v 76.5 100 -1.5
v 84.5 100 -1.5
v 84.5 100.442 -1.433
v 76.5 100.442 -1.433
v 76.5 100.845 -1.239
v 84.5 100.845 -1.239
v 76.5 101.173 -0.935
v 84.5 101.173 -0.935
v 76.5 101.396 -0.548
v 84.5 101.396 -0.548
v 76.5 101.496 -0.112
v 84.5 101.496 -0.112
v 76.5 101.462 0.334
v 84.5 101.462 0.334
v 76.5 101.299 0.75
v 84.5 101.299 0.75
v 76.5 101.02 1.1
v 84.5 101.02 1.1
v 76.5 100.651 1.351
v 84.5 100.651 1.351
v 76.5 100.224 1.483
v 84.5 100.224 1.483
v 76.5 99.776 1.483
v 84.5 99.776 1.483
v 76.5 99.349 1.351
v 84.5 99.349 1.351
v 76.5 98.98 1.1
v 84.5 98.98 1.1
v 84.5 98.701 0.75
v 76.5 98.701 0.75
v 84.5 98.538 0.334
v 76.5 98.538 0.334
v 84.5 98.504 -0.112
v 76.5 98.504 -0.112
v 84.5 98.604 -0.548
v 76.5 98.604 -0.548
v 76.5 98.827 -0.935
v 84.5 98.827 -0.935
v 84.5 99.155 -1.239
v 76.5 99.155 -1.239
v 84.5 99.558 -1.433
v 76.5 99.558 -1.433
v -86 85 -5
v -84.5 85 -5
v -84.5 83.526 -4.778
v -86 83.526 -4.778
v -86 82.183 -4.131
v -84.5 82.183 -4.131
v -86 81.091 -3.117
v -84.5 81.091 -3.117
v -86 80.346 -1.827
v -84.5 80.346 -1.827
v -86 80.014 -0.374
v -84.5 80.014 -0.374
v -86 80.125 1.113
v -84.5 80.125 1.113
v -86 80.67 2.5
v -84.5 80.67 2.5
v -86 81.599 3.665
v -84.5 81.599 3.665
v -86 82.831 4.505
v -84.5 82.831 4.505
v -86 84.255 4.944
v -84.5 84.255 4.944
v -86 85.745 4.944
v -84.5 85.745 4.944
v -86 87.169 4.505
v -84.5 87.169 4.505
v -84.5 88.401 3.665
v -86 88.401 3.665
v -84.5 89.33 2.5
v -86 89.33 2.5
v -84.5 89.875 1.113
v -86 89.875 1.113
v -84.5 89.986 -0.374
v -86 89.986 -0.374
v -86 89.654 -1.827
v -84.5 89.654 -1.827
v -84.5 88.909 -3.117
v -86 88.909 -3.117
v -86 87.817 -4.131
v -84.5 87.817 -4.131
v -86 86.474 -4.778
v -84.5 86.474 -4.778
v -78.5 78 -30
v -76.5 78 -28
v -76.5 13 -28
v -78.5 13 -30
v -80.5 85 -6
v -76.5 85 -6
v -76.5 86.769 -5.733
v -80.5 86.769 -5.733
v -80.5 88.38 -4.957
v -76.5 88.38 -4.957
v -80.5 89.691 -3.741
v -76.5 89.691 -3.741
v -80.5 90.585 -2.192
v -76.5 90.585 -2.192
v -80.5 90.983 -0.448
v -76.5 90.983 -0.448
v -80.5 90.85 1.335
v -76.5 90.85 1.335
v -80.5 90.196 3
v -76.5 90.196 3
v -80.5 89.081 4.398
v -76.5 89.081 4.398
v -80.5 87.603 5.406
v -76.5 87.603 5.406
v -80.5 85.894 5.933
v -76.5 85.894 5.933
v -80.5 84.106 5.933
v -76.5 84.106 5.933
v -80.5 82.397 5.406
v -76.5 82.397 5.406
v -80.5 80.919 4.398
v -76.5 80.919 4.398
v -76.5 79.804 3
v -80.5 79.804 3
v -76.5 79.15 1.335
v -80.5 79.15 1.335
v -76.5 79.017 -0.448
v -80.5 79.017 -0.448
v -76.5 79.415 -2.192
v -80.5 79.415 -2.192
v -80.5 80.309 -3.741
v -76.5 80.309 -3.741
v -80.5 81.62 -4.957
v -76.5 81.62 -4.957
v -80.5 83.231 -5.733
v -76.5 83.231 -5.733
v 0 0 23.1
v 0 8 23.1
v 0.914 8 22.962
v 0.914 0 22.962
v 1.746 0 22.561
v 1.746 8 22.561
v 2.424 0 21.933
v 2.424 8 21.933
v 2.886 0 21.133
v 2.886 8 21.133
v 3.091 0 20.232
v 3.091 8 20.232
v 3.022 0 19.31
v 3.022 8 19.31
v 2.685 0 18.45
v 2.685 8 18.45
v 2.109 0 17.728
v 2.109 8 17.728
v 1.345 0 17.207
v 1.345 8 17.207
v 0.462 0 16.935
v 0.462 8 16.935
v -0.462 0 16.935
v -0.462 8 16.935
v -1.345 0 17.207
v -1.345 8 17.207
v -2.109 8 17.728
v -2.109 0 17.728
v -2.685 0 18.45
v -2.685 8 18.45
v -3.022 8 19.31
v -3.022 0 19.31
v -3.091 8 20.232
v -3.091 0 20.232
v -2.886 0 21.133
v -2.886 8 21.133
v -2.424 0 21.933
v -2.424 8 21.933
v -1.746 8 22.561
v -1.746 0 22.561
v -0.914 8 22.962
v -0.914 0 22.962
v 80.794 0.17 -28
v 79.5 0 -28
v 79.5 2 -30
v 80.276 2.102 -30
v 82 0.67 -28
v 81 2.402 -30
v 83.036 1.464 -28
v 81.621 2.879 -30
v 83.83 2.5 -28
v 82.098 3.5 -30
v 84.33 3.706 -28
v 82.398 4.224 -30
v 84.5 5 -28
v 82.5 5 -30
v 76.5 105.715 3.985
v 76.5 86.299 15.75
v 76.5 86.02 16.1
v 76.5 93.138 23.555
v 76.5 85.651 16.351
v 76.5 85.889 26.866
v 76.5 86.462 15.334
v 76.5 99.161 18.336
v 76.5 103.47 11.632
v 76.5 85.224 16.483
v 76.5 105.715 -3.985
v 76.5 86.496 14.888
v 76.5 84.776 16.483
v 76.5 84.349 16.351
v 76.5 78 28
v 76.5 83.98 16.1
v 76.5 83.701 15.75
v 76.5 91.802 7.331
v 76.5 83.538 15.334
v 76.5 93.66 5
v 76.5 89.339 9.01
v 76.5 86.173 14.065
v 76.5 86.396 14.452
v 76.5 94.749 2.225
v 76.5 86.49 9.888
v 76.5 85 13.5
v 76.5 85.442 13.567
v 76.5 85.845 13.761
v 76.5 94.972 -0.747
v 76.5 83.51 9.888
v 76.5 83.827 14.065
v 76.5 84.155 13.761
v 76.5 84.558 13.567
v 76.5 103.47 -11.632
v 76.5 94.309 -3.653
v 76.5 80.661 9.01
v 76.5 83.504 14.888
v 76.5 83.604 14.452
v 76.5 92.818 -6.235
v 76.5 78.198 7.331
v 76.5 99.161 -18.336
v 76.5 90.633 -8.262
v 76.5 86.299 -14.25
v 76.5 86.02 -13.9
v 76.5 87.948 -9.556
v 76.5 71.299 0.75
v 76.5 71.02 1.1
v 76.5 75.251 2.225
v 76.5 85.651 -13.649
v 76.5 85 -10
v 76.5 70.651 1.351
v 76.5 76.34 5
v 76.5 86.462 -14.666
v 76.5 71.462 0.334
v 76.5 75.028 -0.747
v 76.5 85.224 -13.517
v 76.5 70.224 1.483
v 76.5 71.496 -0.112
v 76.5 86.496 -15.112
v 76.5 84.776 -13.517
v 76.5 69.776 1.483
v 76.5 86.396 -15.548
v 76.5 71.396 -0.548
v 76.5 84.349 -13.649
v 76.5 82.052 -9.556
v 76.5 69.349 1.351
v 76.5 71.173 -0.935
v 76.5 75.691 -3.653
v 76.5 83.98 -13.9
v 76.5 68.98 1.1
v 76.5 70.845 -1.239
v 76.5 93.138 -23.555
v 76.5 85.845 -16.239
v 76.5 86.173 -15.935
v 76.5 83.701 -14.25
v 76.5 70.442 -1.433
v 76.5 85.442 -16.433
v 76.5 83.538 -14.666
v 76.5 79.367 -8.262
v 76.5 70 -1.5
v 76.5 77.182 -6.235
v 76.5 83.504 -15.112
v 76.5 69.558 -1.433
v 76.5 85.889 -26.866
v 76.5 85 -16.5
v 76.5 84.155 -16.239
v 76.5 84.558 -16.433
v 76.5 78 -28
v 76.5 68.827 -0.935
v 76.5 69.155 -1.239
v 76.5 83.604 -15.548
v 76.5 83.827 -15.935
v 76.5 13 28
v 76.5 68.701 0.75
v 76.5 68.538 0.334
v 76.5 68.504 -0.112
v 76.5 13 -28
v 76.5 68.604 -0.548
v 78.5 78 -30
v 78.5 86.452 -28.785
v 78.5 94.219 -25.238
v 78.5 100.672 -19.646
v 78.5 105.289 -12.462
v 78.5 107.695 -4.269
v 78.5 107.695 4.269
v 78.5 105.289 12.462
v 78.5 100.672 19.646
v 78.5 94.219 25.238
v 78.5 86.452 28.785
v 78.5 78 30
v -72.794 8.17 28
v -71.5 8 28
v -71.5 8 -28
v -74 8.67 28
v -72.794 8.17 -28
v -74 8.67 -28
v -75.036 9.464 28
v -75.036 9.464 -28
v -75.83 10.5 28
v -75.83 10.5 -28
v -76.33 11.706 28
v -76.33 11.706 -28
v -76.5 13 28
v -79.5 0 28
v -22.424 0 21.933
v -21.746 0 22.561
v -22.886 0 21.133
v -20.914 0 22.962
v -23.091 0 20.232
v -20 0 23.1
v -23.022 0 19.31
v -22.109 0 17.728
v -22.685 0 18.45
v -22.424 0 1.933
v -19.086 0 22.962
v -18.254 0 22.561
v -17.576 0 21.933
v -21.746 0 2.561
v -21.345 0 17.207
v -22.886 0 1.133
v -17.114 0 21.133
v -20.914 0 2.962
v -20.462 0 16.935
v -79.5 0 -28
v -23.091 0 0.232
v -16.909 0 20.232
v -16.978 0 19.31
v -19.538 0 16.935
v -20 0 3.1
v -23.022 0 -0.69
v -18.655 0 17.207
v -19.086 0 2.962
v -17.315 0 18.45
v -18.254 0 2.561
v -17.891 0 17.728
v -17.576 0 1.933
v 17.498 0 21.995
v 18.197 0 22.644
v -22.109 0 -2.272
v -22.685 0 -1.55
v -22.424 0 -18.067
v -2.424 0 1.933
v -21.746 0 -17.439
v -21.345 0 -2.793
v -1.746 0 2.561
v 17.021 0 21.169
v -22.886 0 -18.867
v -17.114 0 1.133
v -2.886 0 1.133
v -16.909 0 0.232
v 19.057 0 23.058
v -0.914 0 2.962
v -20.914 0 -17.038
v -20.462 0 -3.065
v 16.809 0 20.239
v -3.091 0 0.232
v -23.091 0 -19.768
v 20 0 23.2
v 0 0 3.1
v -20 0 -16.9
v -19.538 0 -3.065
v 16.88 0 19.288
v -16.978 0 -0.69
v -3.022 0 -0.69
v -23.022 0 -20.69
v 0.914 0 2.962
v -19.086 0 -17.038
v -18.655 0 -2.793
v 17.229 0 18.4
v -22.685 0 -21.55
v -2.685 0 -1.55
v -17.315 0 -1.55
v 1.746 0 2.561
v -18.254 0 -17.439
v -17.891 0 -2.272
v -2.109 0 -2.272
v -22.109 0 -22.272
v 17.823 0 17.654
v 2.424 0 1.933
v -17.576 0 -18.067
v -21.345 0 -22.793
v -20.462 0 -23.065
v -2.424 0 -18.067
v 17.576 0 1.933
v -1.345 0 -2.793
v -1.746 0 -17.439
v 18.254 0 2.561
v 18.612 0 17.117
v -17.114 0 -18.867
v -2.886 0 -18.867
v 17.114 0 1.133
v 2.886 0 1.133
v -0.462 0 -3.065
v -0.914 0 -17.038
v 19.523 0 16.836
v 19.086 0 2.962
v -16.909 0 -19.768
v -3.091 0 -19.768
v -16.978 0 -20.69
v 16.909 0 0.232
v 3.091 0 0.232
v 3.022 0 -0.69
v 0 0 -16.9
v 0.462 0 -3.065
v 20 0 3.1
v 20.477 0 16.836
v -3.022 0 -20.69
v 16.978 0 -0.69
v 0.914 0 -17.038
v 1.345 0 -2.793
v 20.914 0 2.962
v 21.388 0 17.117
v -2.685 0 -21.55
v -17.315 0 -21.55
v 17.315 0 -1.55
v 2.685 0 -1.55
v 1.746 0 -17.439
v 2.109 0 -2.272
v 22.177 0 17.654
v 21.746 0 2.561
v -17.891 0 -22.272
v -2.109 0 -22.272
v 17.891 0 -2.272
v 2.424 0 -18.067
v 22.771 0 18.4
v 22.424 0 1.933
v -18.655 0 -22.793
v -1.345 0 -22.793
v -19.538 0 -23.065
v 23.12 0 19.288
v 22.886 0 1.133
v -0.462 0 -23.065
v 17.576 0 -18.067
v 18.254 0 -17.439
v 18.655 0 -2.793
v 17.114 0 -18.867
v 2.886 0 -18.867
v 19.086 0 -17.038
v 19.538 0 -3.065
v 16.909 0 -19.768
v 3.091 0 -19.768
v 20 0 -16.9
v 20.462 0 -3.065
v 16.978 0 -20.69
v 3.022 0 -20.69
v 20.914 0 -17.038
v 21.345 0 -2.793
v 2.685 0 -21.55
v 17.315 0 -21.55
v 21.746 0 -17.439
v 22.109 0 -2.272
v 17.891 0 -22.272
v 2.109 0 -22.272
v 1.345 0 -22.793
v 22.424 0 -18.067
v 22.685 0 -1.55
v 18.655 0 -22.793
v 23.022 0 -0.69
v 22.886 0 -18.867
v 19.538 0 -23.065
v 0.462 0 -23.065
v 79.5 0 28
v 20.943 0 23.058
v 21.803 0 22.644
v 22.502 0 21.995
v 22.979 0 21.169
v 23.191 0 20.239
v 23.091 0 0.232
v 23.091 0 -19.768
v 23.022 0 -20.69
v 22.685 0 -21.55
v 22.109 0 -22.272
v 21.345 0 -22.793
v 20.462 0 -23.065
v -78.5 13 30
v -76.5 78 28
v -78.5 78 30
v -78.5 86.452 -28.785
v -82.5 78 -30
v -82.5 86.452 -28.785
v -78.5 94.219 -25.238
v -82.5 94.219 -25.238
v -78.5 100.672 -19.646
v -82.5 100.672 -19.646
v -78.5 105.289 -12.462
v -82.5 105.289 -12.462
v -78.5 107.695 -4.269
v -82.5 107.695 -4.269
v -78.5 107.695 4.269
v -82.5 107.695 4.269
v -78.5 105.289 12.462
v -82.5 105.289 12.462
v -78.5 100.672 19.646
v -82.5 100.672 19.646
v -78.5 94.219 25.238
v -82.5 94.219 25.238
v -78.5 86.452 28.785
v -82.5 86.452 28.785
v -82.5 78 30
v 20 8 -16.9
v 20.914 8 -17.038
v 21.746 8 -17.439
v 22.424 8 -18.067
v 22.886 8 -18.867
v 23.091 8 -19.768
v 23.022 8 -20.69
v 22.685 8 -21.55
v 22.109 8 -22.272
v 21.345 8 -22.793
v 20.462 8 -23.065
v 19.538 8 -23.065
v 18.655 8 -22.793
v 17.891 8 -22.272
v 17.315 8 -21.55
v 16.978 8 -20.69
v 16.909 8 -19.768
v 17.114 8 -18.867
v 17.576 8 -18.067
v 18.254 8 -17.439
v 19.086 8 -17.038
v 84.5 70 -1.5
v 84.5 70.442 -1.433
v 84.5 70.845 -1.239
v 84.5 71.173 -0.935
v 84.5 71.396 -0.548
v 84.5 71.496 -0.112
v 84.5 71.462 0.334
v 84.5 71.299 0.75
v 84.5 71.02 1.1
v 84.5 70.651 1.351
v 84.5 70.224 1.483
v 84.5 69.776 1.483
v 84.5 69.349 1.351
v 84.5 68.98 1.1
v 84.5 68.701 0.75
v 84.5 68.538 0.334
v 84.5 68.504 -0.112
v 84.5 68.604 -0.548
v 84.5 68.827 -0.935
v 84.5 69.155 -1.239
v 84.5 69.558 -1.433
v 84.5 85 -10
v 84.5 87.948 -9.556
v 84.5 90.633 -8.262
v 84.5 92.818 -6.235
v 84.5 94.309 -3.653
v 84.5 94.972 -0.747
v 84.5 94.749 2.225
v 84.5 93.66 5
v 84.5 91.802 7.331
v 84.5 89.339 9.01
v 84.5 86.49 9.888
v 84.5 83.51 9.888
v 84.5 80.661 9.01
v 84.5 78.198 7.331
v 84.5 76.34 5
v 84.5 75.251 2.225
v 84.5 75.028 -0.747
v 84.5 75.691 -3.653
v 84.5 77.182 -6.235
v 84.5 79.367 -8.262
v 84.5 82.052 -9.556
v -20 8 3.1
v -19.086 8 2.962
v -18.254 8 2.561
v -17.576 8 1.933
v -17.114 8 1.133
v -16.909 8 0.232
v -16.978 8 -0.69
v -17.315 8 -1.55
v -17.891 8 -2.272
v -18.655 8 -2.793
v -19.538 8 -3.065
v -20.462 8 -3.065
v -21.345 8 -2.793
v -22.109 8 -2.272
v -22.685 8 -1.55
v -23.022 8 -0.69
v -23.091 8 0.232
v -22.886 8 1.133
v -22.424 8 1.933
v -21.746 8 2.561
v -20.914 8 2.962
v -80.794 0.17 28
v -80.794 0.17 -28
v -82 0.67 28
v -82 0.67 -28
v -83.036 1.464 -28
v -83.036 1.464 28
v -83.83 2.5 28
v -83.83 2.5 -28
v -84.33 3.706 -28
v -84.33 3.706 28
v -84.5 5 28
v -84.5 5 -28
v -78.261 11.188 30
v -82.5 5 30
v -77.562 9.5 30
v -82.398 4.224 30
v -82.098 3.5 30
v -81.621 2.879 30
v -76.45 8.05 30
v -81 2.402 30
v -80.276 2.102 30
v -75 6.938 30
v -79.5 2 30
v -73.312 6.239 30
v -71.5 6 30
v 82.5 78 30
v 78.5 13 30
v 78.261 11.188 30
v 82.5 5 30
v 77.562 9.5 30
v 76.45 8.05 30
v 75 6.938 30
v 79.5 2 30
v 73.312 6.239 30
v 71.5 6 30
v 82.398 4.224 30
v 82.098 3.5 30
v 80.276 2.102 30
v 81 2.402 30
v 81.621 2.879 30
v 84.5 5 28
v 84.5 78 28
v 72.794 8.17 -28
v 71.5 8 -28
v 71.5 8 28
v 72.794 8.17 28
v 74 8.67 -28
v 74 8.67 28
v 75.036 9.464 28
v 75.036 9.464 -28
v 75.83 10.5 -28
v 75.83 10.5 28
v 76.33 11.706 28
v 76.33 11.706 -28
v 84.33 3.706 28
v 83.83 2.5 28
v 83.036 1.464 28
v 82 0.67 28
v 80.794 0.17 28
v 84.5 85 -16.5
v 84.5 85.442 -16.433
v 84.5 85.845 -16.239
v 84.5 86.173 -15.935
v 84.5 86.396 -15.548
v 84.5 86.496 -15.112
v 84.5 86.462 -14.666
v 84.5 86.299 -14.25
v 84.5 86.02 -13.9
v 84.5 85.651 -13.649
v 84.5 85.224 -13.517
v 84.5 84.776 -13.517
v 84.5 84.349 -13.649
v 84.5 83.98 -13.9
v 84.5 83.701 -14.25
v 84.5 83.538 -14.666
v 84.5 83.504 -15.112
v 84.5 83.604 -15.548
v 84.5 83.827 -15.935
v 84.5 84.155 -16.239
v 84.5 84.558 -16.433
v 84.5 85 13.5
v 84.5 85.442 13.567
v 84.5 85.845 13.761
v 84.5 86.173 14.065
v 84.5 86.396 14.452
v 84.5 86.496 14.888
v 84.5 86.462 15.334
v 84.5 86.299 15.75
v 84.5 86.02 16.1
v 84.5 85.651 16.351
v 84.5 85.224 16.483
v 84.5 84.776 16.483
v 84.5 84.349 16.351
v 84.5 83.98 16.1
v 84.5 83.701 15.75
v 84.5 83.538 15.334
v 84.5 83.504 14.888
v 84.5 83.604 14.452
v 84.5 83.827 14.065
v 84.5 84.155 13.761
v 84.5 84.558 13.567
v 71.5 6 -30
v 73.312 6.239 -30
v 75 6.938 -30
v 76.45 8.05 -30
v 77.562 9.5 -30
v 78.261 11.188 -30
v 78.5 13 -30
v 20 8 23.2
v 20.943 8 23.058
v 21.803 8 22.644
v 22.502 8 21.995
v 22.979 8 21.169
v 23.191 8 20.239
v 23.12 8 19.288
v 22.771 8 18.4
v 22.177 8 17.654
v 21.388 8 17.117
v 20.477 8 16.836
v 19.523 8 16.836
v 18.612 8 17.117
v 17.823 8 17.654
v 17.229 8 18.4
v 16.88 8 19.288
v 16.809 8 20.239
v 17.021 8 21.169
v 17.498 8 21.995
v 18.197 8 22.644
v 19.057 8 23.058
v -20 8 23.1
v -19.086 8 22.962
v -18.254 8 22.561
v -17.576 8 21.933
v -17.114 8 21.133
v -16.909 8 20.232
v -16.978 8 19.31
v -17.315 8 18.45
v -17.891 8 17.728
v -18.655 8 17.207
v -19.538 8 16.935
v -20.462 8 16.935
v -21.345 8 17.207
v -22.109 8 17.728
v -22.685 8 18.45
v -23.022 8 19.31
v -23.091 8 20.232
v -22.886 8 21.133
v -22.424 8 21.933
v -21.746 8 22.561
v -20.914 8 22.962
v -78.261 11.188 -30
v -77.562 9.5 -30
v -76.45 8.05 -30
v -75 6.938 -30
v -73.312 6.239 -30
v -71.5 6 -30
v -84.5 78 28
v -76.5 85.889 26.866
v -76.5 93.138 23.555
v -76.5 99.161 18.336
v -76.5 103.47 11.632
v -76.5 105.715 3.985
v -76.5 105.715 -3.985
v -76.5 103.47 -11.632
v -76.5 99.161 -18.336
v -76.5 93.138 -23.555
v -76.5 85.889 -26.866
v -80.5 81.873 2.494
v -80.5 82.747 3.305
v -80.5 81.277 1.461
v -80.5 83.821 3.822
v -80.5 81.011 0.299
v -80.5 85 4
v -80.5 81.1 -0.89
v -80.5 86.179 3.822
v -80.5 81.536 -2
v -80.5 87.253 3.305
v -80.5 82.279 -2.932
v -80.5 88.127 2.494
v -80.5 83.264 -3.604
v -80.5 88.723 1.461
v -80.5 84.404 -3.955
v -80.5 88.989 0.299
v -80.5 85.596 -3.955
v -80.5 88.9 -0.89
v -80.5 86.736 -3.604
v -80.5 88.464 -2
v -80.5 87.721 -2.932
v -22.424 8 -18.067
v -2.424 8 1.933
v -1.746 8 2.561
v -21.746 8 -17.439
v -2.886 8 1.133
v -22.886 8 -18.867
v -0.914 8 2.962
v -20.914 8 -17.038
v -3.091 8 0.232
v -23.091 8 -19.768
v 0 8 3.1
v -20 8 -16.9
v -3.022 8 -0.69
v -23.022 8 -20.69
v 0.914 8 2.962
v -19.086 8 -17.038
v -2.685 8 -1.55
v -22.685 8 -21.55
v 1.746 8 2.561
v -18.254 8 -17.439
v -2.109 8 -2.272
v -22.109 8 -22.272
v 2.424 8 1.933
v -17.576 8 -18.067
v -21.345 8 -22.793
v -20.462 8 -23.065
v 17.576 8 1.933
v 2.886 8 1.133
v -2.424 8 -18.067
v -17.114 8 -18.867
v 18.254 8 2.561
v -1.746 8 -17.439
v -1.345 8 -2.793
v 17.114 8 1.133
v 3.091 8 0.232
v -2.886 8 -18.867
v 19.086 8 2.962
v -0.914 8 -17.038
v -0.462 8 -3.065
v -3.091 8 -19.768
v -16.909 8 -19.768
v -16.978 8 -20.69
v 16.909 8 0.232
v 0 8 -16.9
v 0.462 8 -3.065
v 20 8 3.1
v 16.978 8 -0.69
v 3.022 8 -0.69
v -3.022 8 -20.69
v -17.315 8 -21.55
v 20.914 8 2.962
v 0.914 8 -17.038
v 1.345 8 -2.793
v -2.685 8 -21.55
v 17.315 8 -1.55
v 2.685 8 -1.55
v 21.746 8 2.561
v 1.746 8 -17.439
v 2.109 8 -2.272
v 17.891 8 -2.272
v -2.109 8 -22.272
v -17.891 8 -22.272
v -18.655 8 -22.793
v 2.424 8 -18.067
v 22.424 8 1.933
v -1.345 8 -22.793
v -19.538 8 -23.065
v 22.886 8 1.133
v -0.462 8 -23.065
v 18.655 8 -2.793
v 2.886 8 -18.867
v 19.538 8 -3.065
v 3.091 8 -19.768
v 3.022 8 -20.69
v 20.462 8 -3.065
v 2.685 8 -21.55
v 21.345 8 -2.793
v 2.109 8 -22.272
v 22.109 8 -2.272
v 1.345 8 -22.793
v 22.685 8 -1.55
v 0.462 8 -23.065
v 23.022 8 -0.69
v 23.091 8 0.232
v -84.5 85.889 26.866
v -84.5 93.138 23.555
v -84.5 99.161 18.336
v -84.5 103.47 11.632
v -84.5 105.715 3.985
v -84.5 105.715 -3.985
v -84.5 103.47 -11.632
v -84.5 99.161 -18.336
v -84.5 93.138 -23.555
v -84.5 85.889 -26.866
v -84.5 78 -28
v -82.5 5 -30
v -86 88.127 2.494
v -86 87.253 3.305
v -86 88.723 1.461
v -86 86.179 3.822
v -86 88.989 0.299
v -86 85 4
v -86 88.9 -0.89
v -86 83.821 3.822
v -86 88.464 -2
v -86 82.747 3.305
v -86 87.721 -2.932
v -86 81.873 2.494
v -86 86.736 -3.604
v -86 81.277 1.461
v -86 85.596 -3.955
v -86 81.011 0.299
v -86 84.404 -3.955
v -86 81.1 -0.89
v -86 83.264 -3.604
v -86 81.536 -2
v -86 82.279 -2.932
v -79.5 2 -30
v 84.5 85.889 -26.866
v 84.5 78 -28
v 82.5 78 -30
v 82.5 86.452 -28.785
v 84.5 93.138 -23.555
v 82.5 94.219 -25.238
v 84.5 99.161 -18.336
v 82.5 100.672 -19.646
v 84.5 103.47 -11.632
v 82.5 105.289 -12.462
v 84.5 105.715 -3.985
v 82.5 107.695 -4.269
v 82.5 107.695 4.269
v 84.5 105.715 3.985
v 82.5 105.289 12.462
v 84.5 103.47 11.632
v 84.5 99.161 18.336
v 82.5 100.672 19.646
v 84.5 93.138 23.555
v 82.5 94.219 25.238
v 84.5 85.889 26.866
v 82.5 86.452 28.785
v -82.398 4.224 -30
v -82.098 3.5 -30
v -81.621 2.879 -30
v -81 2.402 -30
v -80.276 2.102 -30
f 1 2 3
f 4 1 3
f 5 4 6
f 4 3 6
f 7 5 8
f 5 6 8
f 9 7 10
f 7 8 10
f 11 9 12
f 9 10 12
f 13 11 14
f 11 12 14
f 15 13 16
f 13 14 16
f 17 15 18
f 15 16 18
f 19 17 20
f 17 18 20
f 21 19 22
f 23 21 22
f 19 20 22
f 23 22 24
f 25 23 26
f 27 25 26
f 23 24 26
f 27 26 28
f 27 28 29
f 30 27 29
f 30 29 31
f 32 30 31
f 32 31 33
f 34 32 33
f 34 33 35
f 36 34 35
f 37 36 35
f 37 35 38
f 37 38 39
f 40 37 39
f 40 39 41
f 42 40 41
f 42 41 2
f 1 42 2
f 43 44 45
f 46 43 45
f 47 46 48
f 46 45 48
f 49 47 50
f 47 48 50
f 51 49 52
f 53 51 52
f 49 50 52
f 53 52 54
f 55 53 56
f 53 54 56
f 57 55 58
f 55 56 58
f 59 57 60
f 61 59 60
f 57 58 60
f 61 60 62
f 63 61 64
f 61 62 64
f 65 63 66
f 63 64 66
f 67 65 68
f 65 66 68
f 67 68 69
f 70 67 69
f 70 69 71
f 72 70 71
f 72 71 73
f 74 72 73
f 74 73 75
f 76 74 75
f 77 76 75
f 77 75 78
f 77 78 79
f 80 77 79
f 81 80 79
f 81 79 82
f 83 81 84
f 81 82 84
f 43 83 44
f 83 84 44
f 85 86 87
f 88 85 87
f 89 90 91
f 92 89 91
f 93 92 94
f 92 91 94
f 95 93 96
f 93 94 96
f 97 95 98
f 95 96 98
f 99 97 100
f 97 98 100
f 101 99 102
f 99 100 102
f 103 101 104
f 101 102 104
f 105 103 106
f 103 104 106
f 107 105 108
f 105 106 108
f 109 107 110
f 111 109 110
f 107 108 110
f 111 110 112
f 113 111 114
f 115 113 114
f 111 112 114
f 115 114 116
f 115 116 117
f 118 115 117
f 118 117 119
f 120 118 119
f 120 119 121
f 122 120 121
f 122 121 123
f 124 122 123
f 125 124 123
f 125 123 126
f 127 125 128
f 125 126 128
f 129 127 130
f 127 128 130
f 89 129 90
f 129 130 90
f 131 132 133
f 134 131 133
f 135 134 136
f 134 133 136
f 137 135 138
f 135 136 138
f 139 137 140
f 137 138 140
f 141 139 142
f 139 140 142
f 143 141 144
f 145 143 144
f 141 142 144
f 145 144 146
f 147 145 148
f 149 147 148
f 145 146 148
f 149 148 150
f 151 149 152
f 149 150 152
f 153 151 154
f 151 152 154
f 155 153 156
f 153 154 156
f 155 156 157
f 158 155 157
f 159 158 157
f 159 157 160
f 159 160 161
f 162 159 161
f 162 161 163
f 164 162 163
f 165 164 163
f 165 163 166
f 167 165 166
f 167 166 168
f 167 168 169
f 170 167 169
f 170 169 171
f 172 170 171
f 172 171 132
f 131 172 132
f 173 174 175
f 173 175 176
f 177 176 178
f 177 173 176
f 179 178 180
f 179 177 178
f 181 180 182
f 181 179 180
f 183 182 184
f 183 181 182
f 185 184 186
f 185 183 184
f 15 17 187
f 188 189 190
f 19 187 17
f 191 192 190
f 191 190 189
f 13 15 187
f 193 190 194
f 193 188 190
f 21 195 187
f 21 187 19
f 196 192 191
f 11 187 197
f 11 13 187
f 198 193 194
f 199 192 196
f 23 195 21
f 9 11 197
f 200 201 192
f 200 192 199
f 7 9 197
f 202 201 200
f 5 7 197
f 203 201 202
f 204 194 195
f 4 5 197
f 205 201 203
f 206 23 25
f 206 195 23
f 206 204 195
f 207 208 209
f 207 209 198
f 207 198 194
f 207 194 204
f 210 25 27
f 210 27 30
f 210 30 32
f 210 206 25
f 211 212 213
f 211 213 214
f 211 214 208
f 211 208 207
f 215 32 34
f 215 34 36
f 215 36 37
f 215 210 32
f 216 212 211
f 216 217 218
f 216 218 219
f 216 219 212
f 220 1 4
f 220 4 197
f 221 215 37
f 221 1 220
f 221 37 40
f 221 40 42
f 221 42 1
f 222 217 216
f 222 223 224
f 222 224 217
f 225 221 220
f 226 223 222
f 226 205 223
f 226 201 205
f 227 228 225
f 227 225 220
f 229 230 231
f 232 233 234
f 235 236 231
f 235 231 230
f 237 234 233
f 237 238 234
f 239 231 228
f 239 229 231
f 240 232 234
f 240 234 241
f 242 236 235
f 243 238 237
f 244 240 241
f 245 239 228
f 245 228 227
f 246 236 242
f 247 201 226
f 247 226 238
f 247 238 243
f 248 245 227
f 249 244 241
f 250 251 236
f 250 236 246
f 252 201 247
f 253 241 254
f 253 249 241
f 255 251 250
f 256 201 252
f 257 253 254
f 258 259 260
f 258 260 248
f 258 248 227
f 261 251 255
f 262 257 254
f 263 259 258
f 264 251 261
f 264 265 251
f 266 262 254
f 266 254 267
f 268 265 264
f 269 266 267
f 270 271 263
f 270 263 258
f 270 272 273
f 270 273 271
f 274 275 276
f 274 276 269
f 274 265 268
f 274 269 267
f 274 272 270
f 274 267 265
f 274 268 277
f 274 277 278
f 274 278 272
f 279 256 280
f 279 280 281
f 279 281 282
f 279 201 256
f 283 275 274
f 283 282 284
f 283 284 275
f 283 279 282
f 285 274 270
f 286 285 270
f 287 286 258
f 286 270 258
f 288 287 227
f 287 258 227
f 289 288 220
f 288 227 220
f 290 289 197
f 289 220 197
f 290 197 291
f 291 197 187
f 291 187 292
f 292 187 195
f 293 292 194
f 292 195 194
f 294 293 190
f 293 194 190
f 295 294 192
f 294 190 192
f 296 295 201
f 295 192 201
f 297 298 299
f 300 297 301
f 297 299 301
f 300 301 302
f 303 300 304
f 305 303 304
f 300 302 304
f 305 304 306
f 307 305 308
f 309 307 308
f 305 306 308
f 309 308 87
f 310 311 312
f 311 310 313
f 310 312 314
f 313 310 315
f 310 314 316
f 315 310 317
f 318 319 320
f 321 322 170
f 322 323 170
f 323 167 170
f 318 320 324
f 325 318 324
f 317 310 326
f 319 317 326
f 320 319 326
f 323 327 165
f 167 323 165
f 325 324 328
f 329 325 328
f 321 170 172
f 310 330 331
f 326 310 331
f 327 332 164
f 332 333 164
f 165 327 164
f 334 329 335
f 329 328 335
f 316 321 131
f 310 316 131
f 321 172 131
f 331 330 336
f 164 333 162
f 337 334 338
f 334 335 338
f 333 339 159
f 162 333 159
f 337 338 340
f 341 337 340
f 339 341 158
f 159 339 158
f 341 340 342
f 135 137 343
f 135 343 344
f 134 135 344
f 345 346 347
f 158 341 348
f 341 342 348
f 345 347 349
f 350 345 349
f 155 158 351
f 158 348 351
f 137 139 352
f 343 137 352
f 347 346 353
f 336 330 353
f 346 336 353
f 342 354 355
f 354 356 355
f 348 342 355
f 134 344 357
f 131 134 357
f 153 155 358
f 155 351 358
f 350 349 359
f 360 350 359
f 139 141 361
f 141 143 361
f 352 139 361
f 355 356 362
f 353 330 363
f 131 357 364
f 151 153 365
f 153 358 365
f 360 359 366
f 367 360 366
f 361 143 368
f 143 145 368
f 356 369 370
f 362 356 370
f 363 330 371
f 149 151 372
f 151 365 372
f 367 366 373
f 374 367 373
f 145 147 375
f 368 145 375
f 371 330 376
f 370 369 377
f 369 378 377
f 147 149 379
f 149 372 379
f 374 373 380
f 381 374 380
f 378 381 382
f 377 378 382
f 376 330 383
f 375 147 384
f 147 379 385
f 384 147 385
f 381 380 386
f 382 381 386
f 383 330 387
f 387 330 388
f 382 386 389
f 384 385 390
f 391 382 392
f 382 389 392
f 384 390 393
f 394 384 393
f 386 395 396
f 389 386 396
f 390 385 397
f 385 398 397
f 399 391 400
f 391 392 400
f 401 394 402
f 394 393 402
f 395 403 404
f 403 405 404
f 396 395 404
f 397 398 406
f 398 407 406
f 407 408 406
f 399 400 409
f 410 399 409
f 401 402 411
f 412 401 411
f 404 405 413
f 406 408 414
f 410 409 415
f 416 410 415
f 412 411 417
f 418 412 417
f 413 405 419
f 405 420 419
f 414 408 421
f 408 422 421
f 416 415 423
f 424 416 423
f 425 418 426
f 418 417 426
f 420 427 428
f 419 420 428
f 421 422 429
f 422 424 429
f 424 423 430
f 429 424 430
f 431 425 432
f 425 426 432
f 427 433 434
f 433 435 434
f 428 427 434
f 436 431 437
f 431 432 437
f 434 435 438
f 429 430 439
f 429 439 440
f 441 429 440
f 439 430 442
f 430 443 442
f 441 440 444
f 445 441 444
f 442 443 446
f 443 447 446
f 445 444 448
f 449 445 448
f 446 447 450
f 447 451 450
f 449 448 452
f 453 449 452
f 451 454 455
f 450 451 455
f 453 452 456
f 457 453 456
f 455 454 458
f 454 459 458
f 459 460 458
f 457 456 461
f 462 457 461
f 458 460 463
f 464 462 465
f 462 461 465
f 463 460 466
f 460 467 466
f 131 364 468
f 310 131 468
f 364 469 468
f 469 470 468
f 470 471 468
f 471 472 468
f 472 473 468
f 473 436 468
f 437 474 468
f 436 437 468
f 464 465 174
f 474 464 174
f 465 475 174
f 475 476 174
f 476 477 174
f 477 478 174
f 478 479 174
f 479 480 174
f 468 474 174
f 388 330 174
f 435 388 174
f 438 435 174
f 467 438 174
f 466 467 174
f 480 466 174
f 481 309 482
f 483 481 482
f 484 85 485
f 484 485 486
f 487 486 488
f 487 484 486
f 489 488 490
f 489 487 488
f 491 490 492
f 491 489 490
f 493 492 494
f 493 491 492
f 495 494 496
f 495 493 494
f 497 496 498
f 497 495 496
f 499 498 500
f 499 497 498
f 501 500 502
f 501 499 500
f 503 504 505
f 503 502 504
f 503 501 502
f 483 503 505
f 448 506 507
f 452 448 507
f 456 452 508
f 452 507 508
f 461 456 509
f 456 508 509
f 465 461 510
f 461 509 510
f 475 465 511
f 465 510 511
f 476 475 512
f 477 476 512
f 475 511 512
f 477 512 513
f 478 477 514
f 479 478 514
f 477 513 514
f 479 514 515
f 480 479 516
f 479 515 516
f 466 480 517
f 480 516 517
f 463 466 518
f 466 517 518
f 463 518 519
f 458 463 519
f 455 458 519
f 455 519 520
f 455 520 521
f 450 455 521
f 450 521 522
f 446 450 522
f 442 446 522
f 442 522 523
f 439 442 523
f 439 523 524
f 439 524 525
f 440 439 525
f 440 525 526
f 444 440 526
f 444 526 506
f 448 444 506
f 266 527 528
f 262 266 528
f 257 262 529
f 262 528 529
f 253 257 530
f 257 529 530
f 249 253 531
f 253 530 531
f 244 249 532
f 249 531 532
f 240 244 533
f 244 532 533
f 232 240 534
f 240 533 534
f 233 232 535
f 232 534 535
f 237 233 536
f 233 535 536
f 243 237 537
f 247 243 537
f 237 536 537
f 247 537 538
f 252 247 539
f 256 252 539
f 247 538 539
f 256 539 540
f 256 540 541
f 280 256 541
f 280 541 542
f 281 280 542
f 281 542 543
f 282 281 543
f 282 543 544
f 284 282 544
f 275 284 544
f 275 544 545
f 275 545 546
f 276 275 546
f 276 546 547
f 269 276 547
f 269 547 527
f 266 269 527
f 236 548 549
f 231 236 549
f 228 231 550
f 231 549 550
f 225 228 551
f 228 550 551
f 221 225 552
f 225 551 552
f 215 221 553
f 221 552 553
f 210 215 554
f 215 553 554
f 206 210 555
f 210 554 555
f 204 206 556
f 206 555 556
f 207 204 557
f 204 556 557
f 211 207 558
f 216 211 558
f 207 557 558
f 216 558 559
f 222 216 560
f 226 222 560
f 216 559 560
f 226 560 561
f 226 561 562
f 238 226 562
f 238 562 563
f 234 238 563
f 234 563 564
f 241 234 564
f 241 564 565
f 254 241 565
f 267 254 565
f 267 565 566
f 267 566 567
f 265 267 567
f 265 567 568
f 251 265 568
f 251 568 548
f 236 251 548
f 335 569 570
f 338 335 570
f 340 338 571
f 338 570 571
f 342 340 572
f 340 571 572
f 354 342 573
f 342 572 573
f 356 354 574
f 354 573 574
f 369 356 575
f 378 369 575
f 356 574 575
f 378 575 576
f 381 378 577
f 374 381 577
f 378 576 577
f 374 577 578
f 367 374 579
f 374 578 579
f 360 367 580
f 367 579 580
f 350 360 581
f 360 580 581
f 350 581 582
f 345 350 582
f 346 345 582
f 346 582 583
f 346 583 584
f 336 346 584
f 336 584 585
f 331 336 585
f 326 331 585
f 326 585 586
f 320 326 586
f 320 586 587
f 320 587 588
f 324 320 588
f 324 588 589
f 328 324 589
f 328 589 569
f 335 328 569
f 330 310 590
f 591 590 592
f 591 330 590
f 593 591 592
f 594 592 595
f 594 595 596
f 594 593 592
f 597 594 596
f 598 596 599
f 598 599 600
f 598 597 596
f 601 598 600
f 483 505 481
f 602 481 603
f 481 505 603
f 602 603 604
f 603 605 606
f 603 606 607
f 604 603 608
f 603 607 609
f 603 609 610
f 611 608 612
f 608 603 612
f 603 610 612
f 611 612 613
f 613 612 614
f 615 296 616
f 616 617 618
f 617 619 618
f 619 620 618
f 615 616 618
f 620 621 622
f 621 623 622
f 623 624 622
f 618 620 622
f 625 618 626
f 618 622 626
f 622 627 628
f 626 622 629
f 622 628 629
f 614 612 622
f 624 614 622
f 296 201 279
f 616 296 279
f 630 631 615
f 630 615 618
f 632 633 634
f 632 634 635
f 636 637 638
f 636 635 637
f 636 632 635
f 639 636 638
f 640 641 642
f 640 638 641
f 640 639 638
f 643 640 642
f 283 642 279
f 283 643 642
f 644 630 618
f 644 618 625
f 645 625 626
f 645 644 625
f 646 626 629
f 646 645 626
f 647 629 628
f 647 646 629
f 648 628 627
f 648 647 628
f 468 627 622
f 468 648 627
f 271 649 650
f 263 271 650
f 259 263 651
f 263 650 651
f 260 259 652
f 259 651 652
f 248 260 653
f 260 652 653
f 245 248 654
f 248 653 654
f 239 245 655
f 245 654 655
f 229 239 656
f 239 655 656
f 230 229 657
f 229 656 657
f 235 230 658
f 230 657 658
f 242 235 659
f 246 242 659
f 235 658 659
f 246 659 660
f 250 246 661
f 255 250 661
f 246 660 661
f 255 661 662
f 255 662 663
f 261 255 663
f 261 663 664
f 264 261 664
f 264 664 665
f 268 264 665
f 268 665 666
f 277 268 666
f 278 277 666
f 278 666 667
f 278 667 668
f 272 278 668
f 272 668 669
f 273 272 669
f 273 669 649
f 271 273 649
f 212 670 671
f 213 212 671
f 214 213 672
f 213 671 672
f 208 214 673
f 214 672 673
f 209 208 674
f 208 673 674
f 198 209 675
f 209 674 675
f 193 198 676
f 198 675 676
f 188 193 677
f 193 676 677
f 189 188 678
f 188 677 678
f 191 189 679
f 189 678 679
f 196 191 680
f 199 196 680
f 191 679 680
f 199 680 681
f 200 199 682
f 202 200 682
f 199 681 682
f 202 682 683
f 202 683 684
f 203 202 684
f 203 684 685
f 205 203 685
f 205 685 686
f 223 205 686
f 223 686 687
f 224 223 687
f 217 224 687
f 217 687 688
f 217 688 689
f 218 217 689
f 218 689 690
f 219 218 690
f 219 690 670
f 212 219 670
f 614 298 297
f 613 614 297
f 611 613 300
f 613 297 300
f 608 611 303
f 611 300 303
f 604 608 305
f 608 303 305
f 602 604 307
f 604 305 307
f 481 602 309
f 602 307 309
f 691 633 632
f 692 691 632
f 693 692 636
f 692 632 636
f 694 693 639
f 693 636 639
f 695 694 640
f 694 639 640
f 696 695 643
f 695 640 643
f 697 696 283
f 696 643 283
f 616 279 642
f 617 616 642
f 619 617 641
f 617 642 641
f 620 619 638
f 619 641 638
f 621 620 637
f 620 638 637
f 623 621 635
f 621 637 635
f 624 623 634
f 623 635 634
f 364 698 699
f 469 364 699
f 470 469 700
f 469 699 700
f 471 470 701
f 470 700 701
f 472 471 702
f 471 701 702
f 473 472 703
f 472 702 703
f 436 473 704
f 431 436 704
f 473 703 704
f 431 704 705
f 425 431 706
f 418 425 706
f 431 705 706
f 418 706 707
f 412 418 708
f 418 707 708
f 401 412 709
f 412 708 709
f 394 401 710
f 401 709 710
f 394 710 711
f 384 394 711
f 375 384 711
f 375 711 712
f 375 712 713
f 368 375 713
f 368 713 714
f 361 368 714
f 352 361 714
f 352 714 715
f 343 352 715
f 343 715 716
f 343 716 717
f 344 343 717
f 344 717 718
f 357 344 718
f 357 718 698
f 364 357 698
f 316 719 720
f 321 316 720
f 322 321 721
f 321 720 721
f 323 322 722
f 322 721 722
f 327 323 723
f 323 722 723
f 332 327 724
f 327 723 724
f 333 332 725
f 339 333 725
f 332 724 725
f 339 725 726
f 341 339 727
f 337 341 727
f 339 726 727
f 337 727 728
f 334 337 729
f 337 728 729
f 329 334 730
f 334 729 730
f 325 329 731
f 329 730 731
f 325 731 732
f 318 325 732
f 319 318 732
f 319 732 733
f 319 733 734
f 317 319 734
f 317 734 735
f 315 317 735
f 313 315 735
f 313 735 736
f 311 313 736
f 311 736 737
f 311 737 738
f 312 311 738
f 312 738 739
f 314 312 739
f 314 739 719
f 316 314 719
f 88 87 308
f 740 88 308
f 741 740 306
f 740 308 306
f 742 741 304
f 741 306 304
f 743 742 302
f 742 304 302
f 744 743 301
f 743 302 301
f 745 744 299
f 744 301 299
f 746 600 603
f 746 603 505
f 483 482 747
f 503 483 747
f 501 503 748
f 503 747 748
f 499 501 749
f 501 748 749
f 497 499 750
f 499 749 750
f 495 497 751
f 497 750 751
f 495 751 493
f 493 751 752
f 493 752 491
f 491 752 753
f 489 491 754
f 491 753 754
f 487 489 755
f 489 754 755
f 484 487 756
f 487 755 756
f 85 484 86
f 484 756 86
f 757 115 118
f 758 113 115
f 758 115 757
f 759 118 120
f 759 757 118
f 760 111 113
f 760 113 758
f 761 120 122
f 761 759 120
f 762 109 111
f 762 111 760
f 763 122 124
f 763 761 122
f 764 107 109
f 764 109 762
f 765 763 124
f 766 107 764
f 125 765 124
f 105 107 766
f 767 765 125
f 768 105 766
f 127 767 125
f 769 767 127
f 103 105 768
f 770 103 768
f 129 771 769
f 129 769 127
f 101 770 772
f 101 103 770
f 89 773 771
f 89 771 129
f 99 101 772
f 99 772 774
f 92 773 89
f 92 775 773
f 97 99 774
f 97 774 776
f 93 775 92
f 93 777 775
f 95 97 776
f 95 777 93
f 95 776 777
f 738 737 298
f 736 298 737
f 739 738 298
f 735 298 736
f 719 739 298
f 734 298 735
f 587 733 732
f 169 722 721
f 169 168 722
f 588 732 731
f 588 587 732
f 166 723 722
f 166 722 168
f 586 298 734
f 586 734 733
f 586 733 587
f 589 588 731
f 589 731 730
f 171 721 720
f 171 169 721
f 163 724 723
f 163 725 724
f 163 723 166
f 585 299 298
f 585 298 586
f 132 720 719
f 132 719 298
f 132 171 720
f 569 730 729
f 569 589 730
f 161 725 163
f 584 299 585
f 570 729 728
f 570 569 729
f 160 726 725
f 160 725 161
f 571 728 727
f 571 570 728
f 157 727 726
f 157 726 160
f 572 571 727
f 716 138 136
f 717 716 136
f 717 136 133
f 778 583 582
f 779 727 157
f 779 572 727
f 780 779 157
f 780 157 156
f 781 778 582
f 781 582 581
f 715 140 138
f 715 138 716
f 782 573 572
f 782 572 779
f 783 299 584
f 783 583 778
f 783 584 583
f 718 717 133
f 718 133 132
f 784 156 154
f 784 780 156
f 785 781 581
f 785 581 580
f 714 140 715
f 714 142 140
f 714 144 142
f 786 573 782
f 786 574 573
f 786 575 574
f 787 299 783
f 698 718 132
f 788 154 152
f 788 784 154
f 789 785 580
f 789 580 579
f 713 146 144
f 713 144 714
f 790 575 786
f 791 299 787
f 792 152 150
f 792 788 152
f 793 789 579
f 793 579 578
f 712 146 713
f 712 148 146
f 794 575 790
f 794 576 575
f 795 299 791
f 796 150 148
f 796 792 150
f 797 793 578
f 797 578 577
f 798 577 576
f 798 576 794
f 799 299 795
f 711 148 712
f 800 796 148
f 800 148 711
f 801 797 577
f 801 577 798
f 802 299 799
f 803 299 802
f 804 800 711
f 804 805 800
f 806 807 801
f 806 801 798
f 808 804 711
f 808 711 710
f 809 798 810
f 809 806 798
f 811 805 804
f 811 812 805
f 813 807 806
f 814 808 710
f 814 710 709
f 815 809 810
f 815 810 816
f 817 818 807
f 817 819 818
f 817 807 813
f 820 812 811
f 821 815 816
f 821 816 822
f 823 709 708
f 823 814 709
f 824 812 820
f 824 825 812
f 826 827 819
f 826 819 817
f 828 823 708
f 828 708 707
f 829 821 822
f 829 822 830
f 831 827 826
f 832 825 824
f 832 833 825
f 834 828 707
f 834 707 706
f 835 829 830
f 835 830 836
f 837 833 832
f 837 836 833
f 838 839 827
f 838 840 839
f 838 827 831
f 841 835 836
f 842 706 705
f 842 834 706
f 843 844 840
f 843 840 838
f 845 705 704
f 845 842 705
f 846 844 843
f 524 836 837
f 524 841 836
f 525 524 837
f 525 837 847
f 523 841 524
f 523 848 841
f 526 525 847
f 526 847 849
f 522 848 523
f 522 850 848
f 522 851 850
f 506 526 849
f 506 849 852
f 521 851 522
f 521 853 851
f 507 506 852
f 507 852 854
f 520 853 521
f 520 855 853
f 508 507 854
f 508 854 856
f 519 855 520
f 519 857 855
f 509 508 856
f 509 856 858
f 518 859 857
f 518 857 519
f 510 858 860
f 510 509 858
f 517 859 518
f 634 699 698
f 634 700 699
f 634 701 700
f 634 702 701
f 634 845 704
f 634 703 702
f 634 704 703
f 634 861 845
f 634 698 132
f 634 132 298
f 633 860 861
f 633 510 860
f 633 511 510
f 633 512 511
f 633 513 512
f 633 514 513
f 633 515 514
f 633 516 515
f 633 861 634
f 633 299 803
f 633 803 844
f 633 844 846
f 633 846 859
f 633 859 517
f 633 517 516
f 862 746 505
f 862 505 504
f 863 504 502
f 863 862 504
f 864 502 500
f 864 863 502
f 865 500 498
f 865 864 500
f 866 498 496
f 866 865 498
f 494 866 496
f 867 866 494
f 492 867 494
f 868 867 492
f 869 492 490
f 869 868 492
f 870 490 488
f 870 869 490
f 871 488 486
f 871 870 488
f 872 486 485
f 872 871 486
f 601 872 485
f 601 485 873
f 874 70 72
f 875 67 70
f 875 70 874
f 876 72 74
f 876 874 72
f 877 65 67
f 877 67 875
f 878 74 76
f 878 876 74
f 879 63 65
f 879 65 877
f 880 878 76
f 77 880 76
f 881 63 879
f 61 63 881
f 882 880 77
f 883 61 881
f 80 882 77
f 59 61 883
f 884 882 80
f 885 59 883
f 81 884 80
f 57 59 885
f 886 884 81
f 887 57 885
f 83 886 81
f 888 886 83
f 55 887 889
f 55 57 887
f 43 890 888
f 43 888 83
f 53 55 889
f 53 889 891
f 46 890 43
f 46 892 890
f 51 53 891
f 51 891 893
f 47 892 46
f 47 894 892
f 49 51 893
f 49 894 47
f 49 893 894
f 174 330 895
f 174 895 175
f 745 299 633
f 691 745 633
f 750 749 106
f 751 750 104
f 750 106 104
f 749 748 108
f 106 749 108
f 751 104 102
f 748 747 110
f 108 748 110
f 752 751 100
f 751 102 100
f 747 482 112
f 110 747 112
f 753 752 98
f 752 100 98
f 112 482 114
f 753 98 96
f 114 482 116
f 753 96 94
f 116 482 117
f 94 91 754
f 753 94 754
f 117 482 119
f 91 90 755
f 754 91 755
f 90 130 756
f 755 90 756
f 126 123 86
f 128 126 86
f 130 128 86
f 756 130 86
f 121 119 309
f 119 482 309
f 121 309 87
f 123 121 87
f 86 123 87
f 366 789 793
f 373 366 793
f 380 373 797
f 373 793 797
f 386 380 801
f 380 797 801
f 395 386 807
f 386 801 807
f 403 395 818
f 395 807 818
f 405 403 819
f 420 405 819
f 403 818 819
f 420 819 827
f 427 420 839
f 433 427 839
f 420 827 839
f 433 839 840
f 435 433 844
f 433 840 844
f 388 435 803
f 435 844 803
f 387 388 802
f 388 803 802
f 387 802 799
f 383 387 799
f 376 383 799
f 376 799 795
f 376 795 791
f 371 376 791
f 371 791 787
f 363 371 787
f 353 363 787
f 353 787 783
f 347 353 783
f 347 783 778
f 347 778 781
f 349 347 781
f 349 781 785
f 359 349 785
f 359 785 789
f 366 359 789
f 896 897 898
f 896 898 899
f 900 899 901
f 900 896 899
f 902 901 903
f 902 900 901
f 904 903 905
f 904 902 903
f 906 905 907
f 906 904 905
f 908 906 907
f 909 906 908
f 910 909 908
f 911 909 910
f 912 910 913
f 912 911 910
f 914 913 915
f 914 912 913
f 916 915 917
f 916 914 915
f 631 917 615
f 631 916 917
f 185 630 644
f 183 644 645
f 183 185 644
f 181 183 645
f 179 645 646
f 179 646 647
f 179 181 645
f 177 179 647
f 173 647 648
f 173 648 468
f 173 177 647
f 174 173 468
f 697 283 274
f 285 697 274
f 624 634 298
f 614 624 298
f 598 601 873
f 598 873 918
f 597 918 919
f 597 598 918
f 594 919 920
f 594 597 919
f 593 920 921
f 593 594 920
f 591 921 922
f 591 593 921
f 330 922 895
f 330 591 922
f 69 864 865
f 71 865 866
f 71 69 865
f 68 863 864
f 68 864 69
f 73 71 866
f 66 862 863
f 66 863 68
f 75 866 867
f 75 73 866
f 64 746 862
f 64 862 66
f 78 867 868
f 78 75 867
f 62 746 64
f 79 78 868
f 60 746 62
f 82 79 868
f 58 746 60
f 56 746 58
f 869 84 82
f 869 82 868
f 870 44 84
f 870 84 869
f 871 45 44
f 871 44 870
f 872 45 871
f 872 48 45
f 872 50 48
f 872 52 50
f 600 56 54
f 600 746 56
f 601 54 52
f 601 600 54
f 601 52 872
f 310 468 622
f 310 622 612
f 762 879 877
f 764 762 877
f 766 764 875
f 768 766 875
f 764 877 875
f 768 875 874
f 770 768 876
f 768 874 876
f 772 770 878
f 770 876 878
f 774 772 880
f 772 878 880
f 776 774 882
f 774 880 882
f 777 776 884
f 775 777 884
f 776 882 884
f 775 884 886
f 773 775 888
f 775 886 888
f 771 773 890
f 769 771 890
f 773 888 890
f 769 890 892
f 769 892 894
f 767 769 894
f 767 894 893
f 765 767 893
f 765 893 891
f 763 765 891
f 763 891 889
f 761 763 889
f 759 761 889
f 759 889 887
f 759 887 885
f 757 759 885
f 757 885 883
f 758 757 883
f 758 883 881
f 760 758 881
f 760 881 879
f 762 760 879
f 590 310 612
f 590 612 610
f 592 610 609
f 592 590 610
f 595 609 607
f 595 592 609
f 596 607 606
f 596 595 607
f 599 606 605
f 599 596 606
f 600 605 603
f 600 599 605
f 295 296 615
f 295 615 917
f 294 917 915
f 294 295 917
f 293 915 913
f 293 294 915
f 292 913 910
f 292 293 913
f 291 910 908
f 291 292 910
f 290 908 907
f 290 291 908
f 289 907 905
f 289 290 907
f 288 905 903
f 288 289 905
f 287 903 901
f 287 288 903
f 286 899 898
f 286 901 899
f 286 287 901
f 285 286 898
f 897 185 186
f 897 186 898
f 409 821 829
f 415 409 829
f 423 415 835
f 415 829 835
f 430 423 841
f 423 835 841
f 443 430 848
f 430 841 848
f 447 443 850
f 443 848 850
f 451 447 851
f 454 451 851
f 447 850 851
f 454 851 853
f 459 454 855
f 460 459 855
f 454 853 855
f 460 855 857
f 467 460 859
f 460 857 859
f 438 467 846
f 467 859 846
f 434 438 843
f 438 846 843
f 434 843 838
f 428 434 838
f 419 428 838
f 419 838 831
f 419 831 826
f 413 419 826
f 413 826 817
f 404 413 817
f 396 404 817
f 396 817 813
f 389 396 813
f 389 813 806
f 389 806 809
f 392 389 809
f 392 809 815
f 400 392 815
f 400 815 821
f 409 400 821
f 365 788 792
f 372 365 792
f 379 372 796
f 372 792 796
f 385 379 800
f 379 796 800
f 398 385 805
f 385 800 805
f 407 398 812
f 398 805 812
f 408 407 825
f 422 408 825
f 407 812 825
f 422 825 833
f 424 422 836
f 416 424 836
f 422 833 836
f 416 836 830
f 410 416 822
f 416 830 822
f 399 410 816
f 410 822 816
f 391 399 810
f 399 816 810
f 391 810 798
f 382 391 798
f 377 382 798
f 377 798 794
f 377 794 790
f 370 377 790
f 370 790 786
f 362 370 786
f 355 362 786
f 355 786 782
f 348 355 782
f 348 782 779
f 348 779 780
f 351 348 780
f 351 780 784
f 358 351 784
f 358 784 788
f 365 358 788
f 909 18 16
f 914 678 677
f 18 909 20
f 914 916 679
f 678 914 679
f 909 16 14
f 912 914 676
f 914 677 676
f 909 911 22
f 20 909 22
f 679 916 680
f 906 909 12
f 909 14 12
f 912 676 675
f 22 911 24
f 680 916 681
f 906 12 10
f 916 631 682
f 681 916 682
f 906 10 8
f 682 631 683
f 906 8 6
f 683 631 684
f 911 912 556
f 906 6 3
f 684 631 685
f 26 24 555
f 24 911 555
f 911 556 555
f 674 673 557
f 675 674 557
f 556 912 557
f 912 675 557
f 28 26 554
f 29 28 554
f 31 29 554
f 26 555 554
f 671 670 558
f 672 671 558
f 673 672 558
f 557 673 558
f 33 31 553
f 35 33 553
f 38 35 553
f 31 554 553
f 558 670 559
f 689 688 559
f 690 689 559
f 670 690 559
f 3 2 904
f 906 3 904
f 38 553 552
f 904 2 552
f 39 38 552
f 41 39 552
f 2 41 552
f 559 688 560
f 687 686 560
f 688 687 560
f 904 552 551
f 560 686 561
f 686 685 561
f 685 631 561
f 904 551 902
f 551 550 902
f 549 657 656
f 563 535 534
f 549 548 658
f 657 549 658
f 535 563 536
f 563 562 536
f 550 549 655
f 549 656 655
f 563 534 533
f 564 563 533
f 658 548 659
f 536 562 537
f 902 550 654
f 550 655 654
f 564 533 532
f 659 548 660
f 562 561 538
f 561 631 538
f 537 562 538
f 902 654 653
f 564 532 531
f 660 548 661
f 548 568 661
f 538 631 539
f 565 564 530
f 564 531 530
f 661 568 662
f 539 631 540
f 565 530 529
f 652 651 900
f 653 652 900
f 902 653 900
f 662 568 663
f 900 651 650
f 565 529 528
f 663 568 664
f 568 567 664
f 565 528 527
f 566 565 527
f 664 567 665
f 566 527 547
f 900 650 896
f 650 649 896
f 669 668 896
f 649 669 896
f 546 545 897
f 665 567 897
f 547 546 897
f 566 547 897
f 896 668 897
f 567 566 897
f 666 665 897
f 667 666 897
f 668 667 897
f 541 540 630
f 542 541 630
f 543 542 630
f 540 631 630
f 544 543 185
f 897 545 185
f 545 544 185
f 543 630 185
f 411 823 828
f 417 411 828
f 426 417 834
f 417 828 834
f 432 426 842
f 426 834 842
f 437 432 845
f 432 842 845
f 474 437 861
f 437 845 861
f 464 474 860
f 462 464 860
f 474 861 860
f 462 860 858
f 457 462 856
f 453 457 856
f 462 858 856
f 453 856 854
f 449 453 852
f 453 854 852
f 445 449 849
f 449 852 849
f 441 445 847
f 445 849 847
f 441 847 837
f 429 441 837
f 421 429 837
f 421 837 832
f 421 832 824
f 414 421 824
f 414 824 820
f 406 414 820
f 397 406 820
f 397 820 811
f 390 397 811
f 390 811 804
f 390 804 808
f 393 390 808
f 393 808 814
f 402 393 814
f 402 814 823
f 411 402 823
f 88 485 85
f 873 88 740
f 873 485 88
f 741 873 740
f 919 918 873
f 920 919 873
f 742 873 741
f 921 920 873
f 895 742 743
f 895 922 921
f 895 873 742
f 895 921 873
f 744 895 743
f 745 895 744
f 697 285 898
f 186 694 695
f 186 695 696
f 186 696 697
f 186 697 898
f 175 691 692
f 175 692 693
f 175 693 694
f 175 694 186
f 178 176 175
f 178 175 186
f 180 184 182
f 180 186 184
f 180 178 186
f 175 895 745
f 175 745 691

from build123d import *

# Parameters (mm, degrees)
SKETCH1_W           = 169
SKETCH1_H           = 60
BOSS_EXTRUDE1_DEPTH = 8
SKETCH2_W           = 8
SKETCH2_H           = 60
BOSS_EXTRUDE2_DEPTH = 100
SKETCH3_R           = 10
SKETCH3_R_2         = 1.5
CUT_EXTRUDE1_DEPTH  = 12
SKETCH5_R           = 5
BOSS_EXTRUDE3_DEPTH = 1.5
SKETCH6_R           = 4
CUT_EXTRUDE3_DEPTH  = 15
SKETCH7_R           = 6
CUT_EXTRUDE4_DEPTH  = 4
FILLET1_RADIUS      = 30
FILLET1_LENGTH      = 8
FILLET2_RADIUS      = 30
FILLET2_LENGTH      = 8
FILLET3_R           = 5
FILLET4_R           = 5
FILLET5_R           = 5
FILLET6_R           = 5
CHAMFER1_SIZE       = 2
SKETCH8_R           = 3.1
SKETCH8_R_2         = 3.2
CUT_EXTRUDE5_DEPTH  = 10


with BuildPart() as part:
    # Sketch1 → Boss-Extrude1 (new body)
    with BuildSketch(Plane(origin=(0, 0, 0), x_dir=(1, 0, 0), z_dir=(0, 1, 0))):
        Rectangle(SKETCH1_W, SKETCH1_H)
    extrude(amount=BOSS_EXTRUDE1_DEPTH)

    # Sketch2 → Boss-Extrude2 (add)
    with BuildSketch(Plane(origin=(0, 8, 0), x_dir=(1, 0, 0), z_dir=(0, 1, 0))):
        with Locations((-80.5, 0)):
            Rectangle(SKETCH2_W, SKETCH2_H)
        with Locations((80.5, 0)):
            Rectangle(SKETCH2_W, SKETCH2_H)
    extrude(amount=BOSS_EXTRUDE2_DEPTH)

    # Sketch3 → Cut-Extrude1 (cut)
    with BuildSketch(Plane(origin=(84.5, 0, 0), x_dir=(0, 0, -1), z_dir=(1, 0, 0))):
        with Locations((0, 85)):
            Circle(SKETCH3_R)
        with Locations((0, 70)):
            Circle(SKETCH3_R_2)
        with Locations((0, 100)):
            Circle(SKETCH3_R_2)
        with Locations((-15, 85)):
            Circle(SKETCH3_R_2)
        with Locations((15, 85)):
            Circle(SKETCH3_R_2)
    extrude(amount=-CUT_EXTRUDE1_DEPTH, mode=Mode.SUBTRACT)

    # Sketch5 → Boss-Extrude3 (add)
    with BuildSketch(Plane.ZY.offset(84.5)):
        with Locations(Location((0, 85, 0), (0, 0, 180))):
            Circle(SKETCH5_R)
    extrude(amount=BOSS_EXTRUDE3_DEPTH)

    # Sketch6 → Cut-Extrude3 (cut)
    with BuildSketch(Plane.ZY.offset(86)):
        with Locations((0, 85)):
            Circle(SKETCH6_R)
    extrude(amount=-CUT_EXTRUDE3_DEPTH, mode=Mode.SUBTRACT)

    # Sketch7 → Cut-Extrude4 (cut)
    with BuildSketch(Plane(origin=(-76.5, 0, 0), x_dir=(0, 0, -1), z_dir=(1, 0, 0))):
        with Locations((0, 85)):
            Circle(SKETCH7_R)
    extrude(amount=-CUT_EXTRUDE4_DEPTH, mode=Mode.SUBTRACT)

    # Fillet1: full round fillet: the end face becomes a half cylinder, R = half its width
    fillet1_face = Plane((80.5, 108, 0), x_dir=(-1, 0, 0), z_dir=(0, 1, 0))  # on the end face: x along it, z out of the body
    fillet1_slab = fillet1_face.offset(-FILLET1_RADIUS / 2) * Box(FILLET1_LENGTH, 2 * FILLET1_RADIUS, FILLET1_RADIUS, mode=Mode.PRIVATE)  # the body's end, R deep
    fillet1_round = Plane((80.5, 78, 0), x_dir=(0, 1, 0), z_dir=(-1, 0, 0)) * Cylinder(FILLET1_RADIUS, FILLET1_LENGTH, mode=Mode.PRIVATE)  # its axis R under the face
    add(fillet1_slab - fillet1_round, mode=Mode.SUBTRACT)

    # Fillet2: full round fillet: the end face becomes a half cylinder, R = half its width
    fillet2_face = Plane((-80.5, 108, 0), x_dir=(1, 0, 0), z_dir=(0, 1, 0))  # on the end face: x along it, z out of the body
    fillet2_slab = fillet2_face.offset(-FILLET2_RADIUS / 2) * Box(FILLET2_LENGTH, 2 * FILLET2_RADIUS, FILLET2_RADIUS, mode=Mode.PRIVATE)  # the body's end, R deep
    fillet2_round = Plane((-80.5, 78, 0), x_dir=(0, 1, 0), z_dir=(1, 0, 0)) * Cylinder(FILLET2_RADIUS, FILLET2_LENGTH, mode=Mode.PRIVATE)  # its axis R under the face
    add(fillet2_slab - fillet2_round, mode=Mode.SUBTRACT)

    # Fillet3
    fillet3_edges = [part.edges().sort_by_distance(p)[0] for p in [
        (76.5, 8, 0),
    ]]
    fillet(fillet3_edges, radius=FILLET3_R)

    # Fillet4
    fillet4_edges = [part.edges().sort_by_distance(p)[0] for p in [
        (-76.5, 8, 0),
    ]]
    fillet(fillet4_edges, radius=FILLET4_R)

    # Fillet5
    fillet5_edges = [part.edges().sort_by_distance(p)[0] for p in [
        (84.5, 0, 0),
    ]]
    fillet(fillet5_edges, radius=FILLET5_R)

    # Fillet6
    fillet6_edges = [part.edges().sort_by_distance(p)[0] for p in [
        (-84.5, 0, 0),
    ]]
    fillet(fillet6_edges, radius=FILLET6_R)

    # Chamfer1
    chamfer1_edges = [part.edges().sort_by_distance(p)[0] for p in [
        (75.035533906, 9.464466094, -30),
        (75.035533906, 9.464466094, 30),
        (0, 8, 30),
        (-75.035533906, 9.464466094, 30),
        (-75.035533906, 9.464466094, -30),
        (0, 0, -30),
        (83.035533906, 1.464466094, 30),
        (83.035533906, 1.464466094, -30),
        (0, 0, 30),
        (-83.035533906, 1.464466094, -30),
        (-83.035533906, 1.464466094, 30),
        (76.5, 45.5, -30),
        (84.5, 41.5, -30),
        (84.5, 41.5, 30),
        (76.5, 45.5, 30),
        (76.5, 108, 0),
        (84.5, 108, 0),
        (-84.5, 41.5, -30),
        (-76.5, 45.5, -30),
        (-76.5, 45.5, 30),
        (-84.5, 41.5, 30),
        (-84.5, 108, 0),
        (-76.5, 108, 0),
        (0, 8, -30),
    ]]
    chamfer(chamfer1_edges, length=CHAMFER1_SIZE)

    # Sketch8 → Cut-Extrude5 (cut)
    with BuildSketch(Plane(origin=(0, 8, 0), x_dir=(1, 0, 0), z_dir=(0, 1, 0))):
        with Locations(Location((0, 0, 0), (0, 0, 270))):
            Circle(SKETCH8_R)
        with Locations(Location((0, 20, 0), (0, 0, 270))):
            Circle(SKETCH8_R)
        with Locations(Location((0, -20, 0), (0, 0, 270))):
            Circle(SKETCH8_R)
        with Locations(Location((-20, -20, 0), (0, 0, 270))):
            Circle(SKETCH8_R)
        with Locations(Location((-20, 20, 0), (0, 0, 270))):
            Circle(SKETCH8_R)
        with Locations(Location((-20, 0, 0), (0, 0, 270))):
            Circle(SKETCH8_R)
        with Locations(Location((20, -20, 0), (0, 0, 270))):
            Circle(SKETCH8_R_2)
        with Locations(Location((20, 0, 0), (0, 0, 270))):
            Circle(SKETCH8_R)
        with Locations(Location((20, 20, 0), (0, 0, 270))):
            Circle(SKETCH8_R)
    extrude(amount=-CUT_EXTRUDE5_DEPTH, mode=Mode.SUBTRACT)


solid = part.part
